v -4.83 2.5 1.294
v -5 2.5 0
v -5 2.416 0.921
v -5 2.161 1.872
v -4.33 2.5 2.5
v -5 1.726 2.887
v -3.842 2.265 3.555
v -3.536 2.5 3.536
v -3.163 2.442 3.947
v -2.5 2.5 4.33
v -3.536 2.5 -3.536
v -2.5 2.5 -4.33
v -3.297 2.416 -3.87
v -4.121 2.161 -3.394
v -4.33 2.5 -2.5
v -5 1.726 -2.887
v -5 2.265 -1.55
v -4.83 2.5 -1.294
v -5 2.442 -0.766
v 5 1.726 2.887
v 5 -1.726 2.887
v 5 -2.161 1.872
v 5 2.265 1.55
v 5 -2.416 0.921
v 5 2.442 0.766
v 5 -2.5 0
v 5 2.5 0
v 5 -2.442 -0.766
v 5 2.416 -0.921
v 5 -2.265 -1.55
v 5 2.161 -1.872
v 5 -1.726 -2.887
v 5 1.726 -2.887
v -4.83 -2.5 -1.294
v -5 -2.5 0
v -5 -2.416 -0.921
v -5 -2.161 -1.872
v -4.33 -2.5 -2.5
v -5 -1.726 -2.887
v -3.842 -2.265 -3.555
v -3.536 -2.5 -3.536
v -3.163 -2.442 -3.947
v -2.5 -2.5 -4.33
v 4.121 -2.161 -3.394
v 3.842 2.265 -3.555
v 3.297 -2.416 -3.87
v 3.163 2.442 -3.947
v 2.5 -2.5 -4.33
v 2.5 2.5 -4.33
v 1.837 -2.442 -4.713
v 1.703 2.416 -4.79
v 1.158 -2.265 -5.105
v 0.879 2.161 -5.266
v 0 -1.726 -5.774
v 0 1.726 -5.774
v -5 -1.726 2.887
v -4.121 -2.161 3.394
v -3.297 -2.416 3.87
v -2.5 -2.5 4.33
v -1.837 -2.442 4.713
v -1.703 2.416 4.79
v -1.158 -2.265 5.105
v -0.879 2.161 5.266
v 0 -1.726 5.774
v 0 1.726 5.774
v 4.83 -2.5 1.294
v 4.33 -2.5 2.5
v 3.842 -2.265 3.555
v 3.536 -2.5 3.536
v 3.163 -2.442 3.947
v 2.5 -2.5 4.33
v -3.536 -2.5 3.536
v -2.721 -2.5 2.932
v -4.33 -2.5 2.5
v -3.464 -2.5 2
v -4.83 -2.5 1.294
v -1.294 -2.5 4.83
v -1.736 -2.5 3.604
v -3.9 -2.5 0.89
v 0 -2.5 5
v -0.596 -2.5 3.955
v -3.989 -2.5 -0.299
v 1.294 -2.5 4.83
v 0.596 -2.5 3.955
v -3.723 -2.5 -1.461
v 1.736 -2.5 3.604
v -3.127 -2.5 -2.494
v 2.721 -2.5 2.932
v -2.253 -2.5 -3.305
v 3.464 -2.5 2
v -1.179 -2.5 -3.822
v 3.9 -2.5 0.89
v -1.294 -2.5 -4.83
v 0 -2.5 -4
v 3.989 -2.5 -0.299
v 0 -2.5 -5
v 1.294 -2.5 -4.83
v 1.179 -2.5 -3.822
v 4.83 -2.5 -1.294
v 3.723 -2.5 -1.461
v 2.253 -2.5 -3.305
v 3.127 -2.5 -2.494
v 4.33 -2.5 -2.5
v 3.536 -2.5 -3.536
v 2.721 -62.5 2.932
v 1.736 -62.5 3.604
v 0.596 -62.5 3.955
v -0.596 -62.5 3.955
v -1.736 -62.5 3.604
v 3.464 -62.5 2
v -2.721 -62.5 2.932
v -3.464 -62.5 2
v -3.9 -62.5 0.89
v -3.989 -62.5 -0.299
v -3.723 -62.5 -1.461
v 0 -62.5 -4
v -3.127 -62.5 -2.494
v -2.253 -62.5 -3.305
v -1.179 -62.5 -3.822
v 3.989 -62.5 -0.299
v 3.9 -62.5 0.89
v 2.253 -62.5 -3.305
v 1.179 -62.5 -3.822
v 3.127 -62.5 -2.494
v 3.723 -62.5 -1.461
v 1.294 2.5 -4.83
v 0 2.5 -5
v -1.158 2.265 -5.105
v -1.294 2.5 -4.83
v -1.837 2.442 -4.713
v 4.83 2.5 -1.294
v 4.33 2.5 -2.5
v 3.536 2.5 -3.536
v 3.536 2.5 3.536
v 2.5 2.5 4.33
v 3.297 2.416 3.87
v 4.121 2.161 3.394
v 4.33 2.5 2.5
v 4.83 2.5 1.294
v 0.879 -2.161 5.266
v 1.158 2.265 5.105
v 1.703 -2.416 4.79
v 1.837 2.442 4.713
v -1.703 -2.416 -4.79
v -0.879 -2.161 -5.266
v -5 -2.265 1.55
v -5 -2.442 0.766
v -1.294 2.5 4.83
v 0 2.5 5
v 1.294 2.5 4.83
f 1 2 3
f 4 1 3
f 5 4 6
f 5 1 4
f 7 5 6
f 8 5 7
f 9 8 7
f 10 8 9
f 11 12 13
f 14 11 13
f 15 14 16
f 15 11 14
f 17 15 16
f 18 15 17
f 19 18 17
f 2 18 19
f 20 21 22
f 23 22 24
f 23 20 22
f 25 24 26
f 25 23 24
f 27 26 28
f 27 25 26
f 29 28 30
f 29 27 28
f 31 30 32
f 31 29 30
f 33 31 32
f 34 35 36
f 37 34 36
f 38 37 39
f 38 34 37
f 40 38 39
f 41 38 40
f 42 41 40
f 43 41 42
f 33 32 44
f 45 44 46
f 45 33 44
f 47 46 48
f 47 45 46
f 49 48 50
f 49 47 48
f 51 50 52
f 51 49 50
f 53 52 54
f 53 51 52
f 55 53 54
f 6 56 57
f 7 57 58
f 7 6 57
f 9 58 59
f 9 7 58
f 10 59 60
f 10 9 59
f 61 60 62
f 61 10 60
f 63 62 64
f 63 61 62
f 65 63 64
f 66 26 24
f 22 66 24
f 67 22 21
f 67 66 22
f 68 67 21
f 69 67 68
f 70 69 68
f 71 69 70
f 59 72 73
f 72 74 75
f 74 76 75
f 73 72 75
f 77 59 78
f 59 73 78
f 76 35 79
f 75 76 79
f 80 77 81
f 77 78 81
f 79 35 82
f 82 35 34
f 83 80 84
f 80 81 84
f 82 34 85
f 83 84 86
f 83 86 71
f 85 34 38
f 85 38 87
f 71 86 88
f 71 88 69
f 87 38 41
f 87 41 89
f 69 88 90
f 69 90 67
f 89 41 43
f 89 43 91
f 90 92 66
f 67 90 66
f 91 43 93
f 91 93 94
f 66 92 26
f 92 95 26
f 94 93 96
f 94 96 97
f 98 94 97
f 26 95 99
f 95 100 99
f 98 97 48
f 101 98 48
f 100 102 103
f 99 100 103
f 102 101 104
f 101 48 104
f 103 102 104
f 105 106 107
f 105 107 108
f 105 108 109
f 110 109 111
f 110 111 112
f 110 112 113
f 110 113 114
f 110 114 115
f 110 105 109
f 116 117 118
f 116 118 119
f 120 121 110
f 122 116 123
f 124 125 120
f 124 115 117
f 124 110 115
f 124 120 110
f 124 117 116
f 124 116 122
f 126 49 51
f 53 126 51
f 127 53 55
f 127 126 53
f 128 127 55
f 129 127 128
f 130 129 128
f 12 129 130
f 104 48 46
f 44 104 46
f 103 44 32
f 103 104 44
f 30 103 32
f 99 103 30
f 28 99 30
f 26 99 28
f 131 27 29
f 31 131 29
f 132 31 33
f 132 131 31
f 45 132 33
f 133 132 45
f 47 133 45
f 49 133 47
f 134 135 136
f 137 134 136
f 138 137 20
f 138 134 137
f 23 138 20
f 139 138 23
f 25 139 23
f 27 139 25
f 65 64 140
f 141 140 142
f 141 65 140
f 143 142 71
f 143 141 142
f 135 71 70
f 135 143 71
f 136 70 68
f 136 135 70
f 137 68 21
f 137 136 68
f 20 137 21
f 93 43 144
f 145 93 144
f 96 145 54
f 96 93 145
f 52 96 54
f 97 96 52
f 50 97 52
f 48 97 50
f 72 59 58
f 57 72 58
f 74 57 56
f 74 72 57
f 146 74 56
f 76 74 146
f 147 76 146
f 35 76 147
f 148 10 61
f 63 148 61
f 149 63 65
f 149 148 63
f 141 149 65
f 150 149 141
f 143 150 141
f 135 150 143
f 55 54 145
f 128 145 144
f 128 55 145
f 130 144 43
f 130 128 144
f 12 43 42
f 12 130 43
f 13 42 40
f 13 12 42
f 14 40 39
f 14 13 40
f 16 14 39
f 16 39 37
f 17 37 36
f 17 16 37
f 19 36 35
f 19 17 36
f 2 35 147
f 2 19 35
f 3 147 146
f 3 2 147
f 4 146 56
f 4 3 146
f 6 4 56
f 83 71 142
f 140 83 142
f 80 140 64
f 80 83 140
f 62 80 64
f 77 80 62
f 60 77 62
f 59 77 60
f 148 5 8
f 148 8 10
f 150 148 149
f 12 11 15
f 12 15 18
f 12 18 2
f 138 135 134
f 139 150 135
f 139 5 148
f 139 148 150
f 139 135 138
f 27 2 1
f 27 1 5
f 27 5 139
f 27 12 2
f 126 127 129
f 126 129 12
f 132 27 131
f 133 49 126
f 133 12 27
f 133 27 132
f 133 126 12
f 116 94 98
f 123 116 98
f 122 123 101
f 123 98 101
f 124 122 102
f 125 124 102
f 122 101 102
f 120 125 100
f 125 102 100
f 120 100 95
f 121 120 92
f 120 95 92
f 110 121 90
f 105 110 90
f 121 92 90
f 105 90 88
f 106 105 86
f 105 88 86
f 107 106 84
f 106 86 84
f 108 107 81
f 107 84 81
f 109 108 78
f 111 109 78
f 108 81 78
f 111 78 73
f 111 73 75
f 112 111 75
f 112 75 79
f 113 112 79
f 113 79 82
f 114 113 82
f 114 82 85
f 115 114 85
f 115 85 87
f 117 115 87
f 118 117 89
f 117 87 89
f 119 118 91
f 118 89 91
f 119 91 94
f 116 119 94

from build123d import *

# Parameters (mm, degrees)
SALIENTE_EXTRUIR1_DEPTH   = 2.5
CROQUIS3_R                = 4
SALIENTE_EXTRUIR3_DEPTH   = 60
CROQUIS4_OUTSIDE_W        = 85.354
CROQUIS4_OUTSIDE_H        = 86.902
CROQUIS4_OUTSIDE_R        = 5
CORTAR_EXTRUIR1_DEPTH     = 30
CORTAR_EXTRUIR1_DRAFT     = -45
SIMETR_A1_COPY_1_SKETCH_W = 85.354
SIMETR_A1_COPY_1_SKETCH_H = 86.902
SIMETR_A1_COPY_1_SKETCH_R = 5
SIMETR_A1_COPY_1_DEPTH    = 30
SIMETR_A1_COPY_1_DRAFT    = -45


with BuildPart() as part:
    # Croquis1 → Saliente-Extruir1 (new, symmetric)
    with BuildSketch(Plane(origin=(0, 0, 0), x_dir=(1, 0, 0), z_dir=(0, 1, 0))):
        Polygon((0, -5.773502692), (5, -2.886751346), (5, 2.886751346), (0, 5.773502692), (-5, 2.886751346), (-5, -2.886751346), align=None)
    extrude(amount=SALIENTE_EXTRUIR1_DEPTH, both=True)

    # Croquis3 → Saliente-Extruir3 (add)
    with BuildSketch(Plane.XZ.offset(2.5)):
        with Locations(Location((0, 0, 0), (0, 0, 270))):
            Circle(CROQUIS3_R)
    extrude(amount=SALIENTE_EXTRUIR3_DEPTH)


with BuildPart() as cortar_extruir1_tool:
    # Croquis4 outside → Cortar-Extruir1 (with draft: the straight prism first)
    with BuildSketch(Plane.XZ.offset(2.5)):
        Rectangle(CROQUIS4_OUTSIDE_W, CROQUIS4_OUTSIDE_H)
        Circle(CROQUIS4_OUTSIDE_R, mode=Mode.SUBTRACT)
    extrude(amount=-CORTAR_EXTRUIR1_DEPTH)
    # Cortar-Extruir1: the draft: its side faces are tilted about the plane it starts from
    cortar_extruir1_sides = [cortar_extruir1_tool.faces().sort_by_distance(p)[0] for p in [
        (0, 12.5, -43.451),
        (42.677, 12.5, 0),
        (0, 12.5, 43.451),
        (-42.677, 12.5, 0),
        (-5, 12.5, 0),
    ]]
    draft(cortar_extruir1_sides, Plane.XZ.offset(2.5), CORTAR_EXTRUIR1_DRAFT)


with BuildPart() as part_1:
    add(part.part)

    # Cortar-Extruir1: cut by cortar_extruir1_tool
    add(cortar_extruir1_tool.part, mode=Mode.SUBTRACT)


with BuildPart() as simetr_a1_copy_1_tool:
    # Simetría1 copy 1 sketch → Simetría1 copy 1 (with draft: the straight prism first)
    with BuildSketch(Plane(origin=(0, 2.5, 0), x_dir=(1, 0, 0), z_dir=(0, 1, 0))):
        Rectangle(SIMETR_A1_COPY_1_SKETCH_W, SIMETR_A1_COPY_1_SKETCH_H)
        Circle(SIMETR_A1_COPY_1_SKETCH_R, mode=Mode.SUBTRACT)
    extrude(amount=-SIMETR_A1_COPY_1_DEPTH)
    # Simetría1 copy 1: the draft: its side faces are tilted about the plane it starts from
    simetr_a1_copy_1_sides = [simetr_a1_copy_1_tool.faces().sort_by_distance(p)[0] for p in [
        (0, -12.5, -43.451),
        (42.677, -12.5, 0),
        (0, -12.5, 43.451),
        (-42.677, -12.5, 0),
        (-5, -12.5, 0),
    ]]
    draft(simetr_a1_copy_1_sides, Plane(origin=(0, 2.5, 0), x_dir=(1, 0, 0), z_dir=(0, 1, 0)), SIMETR_A1_COPY_1_DRAFT)


with BuildPart() as part_2:
    add(part_1.part)

    # Simetría1 copy 1: cut by simetr_a1_copy_1_tool
    add(simetr_a1_copy_1_tool.part, mode=Mode.SUBTRACT)


solid = part_2.part
